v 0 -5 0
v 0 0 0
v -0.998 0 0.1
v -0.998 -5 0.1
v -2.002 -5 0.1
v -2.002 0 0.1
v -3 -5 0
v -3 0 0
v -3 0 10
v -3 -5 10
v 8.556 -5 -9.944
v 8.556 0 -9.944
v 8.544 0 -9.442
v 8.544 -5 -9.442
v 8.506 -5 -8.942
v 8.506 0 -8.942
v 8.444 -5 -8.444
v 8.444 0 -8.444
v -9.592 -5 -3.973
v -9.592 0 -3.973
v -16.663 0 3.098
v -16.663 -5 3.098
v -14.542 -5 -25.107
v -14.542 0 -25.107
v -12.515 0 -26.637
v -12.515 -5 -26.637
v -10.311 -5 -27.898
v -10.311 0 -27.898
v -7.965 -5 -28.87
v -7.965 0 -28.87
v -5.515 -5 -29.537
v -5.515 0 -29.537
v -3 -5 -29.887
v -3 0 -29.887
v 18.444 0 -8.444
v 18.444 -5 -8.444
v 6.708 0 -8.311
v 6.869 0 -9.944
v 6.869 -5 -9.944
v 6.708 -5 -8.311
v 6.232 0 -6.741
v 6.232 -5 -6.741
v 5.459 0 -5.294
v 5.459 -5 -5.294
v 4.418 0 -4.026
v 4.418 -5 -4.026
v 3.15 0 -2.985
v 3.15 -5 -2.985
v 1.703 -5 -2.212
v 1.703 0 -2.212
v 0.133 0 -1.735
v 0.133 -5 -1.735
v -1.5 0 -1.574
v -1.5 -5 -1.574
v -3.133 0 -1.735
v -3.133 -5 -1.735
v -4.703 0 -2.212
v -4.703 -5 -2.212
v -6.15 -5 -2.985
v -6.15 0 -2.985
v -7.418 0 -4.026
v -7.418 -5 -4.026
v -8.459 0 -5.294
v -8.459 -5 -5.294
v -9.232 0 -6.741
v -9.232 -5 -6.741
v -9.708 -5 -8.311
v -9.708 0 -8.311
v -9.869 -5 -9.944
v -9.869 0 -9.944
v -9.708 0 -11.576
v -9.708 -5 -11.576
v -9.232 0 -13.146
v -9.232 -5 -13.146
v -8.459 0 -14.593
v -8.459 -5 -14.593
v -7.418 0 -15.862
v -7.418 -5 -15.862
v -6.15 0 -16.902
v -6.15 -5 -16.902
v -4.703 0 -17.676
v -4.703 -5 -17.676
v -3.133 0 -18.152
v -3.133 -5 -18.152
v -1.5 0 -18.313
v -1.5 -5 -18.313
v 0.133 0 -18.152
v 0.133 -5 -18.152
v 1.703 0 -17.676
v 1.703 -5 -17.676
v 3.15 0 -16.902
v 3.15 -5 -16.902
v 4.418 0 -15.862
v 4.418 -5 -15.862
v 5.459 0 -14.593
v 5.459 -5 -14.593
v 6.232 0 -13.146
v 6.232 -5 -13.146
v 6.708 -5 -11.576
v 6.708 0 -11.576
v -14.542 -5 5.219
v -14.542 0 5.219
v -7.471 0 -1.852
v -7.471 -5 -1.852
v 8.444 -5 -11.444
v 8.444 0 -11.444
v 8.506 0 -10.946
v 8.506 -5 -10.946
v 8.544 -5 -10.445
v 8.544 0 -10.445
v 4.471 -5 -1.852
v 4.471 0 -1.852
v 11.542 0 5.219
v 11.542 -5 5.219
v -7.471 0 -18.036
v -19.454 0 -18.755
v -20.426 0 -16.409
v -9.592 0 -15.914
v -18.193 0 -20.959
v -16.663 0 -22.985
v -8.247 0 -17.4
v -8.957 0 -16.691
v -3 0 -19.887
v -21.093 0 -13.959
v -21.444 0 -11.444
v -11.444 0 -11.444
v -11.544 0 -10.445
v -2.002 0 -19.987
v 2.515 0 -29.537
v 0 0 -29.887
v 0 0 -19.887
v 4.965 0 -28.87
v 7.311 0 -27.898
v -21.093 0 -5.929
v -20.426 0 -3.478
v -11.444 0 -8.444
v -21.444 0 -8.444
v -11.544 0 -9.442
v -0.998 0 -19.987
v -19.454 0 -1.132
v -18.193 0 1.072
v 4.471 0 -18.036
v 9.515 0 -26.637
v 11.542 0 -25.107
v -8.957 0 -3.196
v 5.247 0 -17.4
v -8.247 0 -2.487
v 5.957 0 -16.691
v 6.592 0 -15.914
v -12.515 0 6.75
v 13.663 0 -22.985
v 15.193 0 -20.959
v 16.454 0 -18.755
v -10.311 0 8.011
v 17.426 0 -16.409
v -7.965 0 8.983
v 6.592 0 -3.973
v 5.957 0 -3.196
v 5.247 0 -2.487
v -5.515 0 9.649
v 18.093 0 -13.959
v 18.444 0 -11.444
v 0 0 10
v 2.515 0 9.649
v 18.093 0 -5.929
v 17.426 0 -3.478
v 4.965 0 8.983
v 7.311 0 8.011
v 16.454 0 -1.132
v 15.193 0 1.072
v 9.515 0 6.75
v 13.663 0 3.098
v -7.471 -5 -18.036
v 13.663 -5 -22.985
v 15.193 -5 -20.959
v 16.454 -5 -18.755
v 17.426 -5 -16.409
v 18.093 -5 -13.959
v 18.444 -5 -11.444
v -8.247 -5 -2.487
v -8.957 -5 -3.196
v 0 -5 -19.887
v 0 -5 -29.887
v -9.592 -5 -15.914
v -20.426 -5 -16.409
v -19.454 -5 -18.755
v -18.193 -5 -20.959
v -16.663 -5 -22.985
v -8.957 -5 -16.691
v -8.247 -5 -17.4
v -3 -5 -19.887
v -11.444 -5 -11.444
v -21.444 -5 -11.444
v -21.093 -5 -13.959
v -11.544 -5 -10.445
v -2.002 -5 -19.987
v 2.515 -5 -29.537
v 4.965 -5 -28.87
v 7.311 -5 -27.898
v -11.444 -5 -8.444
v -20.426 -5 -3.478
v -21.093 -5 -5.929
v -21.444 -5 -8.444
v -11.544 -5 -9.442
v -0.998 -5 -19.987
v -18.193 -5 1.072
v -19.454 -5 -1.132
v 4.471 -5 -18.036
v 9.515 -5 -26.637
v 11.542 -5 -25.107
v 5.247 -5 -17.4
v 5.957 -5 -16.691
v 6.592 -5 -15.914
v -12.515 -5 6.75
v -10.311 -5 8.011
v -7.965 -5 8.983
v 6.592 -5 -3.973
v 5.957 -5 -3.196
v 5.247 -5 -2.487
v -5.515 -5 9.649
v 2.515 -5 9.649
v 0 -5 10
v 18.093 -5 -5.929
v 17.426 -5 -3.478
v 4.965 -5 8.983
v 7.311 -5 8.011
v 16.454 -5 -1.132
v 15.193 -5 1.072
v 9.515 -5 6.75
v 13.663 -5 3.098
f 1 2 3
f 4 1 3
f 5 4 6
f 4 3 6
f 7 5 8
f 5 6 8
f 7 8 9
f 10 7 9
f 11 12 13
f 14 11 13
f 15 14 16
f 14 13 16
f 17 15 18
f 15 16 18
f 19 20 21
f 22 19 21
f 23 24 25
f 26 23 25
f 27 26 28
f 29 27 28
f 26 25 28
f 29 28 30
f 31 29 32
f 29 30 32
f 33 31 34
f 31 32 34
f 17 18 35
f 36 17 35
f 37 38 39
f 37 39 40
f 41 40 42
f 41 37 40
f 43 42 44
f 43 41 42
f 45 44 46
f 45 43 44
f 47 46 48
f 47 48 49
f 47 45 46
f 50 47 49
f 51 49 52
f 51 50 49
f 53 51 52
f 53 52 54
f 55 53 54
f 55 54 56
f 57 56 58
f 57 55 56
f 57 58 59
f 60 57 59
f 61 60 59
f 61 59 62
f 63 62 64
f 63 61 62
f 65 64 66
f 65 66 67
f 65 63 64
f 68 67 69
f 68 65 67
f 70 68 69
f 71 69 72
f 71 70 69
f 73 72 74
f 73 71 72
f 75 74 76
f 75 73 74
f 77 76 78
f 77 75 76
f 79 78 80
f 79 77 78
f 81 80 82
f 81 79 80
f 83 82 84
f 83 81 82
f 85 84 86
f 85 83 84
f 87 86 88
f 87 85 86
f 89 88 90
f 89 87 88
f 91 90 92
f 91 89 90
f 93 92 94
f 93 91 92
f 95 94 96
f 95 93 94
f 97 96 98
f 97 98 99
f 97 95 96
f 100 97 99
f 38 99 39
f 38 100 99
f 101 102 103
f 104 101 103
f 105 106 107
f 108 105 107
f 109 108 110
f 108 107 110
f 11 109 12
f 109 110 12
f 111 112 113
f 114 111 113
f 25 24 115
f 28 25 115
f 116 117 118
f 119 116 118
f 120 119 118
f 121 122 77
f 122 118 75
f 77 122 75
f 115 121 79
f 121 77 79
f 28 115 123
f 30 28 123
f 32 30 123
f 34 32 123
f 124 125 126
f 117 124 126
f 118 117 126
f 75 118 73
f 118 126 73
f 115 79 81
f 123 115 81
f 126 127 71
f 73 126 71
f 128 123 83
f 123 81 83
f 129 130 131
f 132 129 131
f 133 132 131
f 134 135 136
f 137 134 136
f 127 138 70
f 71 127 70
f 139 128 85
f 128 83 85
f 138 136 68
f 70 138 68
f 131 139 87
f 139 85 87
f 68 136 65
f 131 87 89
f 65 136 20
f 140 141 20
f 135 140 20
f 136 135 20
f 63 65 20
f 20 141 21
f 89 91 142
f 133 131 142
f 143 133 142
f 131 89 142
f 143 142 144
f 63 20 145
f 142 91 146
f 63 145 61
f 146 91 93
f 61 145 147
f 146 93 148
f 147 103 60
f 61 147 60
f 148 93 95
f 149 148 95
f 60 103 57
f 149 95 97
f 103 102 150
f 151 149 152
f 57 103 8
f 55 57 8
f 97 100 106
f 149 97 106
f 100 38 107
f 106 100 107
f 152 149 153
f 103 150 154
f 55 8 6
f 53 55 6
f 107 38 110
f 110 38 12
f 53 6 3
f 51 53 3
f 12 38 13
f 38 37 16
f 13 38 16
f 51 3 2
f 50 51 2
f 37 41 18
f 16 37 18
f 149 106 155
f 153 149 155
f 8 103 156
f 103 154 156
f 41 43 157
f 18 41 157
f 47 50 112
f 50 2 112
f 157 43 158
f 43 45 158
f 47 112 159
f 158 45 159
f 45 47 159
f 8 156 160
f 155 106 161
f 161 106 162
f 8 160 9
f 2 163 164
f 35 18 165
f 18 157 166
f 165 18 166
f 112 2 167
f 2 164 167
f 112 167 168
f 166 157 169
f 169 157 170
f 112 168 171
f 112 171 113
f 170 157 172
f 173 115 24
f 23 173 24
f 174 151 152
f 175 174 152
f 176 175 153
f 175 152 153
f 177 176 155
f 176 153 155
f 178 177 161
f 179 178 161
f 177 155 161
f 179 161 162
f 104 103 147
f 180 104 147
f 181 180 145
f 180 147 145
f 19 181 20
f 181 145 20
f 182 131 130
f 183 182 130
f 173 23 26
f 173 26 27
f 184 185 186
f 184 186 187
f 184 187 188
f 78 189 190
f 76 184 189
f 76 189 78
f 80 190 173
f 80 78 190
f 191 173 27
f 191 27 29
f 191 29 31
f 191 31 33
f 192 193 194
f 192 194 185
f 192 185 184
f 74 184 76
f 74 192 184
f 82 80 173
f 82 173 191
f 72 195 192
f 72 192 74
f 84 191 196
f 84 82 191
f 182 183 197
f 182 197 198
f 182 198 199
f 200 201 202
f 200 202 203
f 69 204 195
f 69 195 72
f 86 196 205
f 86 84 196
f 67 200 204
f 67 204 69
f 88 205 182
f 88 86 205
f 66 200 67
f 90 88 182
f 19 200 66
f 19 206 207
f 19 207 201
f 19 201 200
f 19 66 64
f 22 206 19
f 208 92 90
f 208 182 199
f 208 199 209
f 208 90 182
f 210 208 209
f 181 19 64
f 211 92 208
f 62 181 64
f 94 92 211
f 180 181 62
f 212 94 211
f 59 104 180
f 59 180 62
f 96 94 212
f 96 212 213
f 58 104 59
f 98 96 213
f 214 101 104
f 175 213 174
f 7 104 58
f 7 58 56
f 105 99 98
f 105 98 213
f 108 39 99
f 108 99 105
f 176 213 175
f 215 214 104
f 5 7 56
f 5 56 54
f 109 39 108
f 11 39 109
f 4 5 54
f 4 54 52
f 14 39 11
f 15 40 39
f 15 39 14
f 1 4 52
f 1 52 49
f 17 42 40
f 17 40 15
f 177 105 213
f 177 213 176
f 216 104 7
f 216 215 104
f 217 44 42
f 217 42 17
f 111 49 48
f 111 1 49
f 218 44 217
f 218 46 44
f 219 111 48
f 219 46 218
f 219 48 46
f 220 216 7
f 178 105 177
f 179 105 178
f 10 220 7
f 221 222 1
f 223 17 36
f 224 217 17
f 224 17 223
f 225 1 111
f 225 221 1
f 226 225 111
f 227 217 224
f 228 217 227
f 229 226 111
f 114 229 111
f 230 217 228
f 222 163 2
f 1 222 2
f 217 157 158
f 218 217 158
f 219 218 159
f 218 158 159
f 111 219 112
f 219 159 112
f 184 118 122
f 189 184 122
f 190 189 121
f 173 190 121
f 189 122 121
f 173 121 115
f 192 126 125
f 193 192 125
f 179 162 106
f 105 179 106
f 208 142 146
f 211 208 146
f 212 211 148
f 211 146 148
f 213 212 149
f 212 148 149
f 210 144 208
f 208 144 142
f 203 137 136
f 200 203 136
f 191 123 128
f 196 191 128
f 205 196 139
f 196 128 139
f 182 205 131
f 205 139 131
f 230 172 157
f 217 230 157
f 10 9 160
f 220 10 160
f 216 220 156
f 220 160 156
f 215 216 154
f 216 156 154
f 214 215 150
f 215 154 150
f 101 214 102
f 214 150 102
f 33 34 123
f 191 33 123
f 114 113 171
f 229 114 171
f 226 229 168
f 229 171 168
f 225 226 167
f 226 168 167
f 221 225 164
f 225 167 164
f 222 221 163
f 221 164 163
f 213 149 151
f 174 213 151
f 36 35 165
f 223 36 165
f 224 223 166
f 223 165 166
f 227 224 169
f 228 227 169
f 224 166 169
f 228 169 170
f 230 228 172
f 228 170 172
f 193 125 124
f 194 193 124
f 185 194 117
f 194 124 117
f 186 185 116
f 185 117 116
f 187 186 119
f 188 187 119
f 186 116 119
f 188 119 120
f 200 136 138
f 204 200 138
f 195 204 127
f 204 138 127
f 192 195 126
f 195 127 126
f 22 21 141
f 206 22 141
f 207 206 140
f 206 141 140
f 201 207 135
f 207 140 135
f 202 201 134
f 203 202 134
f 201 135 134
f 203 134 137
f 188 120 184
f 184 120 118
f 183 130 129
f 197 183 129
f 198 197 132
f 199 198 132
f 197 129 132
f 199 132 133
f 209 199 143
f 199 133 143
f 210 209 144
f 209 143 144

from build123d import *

# Parameters (mm, degrees)
F0_R     = 8.3692261917
F1_DEPTH = 5
F2_DEPTH = 5


with BuildPart() as f1:
    # F0 (on Front) → F1 (new body)
    with BuildSketch(Plane.XZ):
        with BuildLine():
            ThreePointArc((4.4705767925, -1.8517735391), (2.34833025, -0.6529795931), (0, 0))
            Line((0, 0), (-3, 0))
            ThreePointArc((-3, 0), (-5.34833025, -0.6529795931), (-7.4705767925, -1.8517735391))
            Line((-7.4705767925, -1.8517735391), (-9.5918971361, -3.9730938827))
            ThreePointArc((-9.5918971361, -3.9730938827), (-10.7906910821, -6.0953404252), (-11.4436706752, -8.4436706752))
            Line((-11.4436706752, -8.4436706752), (-11.4436706752, -11.4436706752))
            ThreePointArc((-11.4436706752, -11.4436706752), (-10.7906910821, -13.7920009252), (-9.5918971361, -15.9142474677))
            Line((-9.5918971361, -15.9142474677), (-7.4705767925, -18.0355678113))
            ThreePointArc((-7.4705767925, -18.0355678113), (-5.34833025, -19.2343617573), (-3, -19.8873413504))
            Line((-3, -19.8873413504), (0, -19.8873413504))
            ThreePointArc((0, -19.8873413504), (2.34833025, -19.2343617573), (4.4705767925, -18.0355678113))
            Line((4.4705767925, -18.0355678113), (6.5918971361, -15.9142474677))
            ThreePointArc((6.5918971361, -15.9142474677), (7.7906910821, -13.7920009252), (8.4436706752, -11.4436706752))
            Line((8.4436706752, -11.4436706752), (8.4436706752, -8.4436706752))
            ThreePointArc((8.4436706752, -8.4436706752), (7.7906910821, -6.0953404252), (6.5918971361, -3.9730938827))
            Line((6.5918971361, -3.9730938827), (4.4705767925, -1.8517735391))
        make_face()
        with Locations((-1.5, -9.9436706752)):
            Circle(F0_R, mode=Mode.SUBTRACT)
        with BuildLine():
            Line((0, 10), (0, 0))
            ThreePointArc((0, 0), (2.34833025, -0.6529795931), (4.4705767925, -1.8517735391))
            Line((4.4705767925, -1.8517735391), (11.5416446044, 5.2192942728))
            ThreePointArc((11.5416446044, 5.2192942728), (6.1536686473, 8.533919975), (0, 10))
        make_face()
        with BuildLine():
            Line((-3, 0), (0, 0))
            ThreePointArc((0, 0), (-1.5, 0.1125008874), (-3, 0))
        make_face()
        with BuildLine():
            ThreePointArc((-7.4705767925, -1.8517735391), (-5.34833025, -0.6529795931), (-3, 0))
            Line((-3, 0), (-3, 10))
            ThreePointArc((-3, 10), (-9.1536686473, 8.533919975), (-14.5416446044, 5.2192942728))
            Line((-14.5416446044, 5.2192942728), (-7.4705767925, -1.8517735391))
        make_face()
        with BuildLine():
            ThreePointArc((6.5918971361, -3.9730938827), (5.6107871047, -2.8328835705), (4.4705767925, -1.8517735391))
            Line((4.4705767925, -1.8517735391), (6.5918971361, -3.9730938827))
        make_face()
        with BuildLine():
            Line((-9.5918971361, -3.9730938827), (-7.4705767925, -1.8517735391))
            ThreePointArc((-7.4705767925, -1.8517735391), (-8.6107871047, -2.8328835705), (-9.5918971361, -3.9730938827))
        make_face()
        with BuildLine():
            Line((13.662964948, 3.0979739292), (6.5918971361, -3.9730938827))
            ThreePointArc((6.5918971361, -3.9730938827), (7.7906910821, -6.0953404252), (8.4436706752, -8.4436706752))
            Line((8.4436706752, -8.4436706752), (18.4436706752, -8.4436706752))
            ThreePointArc((18.4436706752, -8.4436706752), (16.9775906502, -2.2900020279), (13.662964948, 3.0979739292))
        make_face()
        with BuildLine():
            ThreePointArc((-11.4436706752, -8.4436706752), (-10.7906910821, -6.0953404252), (-9.5918971361, -3.9730938827))
            Line((-9.5918971361, -3.9730938827), (-16.662964948, 3.0979739292))
            ThreePointArc((-16.662964948, 3.0979739292), (-19.9775906502, -2.2900020279), (-21.4436706752, -8.4436706752))
            Line((-21.4436706752, -8.4436706752), (-11.4436706752, -8.4436706752))
        make_face()
        with BuildLine():
            ThreePointArc((8.5561715626, -9.9436706752), (8.5280068999, -9.191564225), (8.4436706752, -8.4436706752))
            Line((8.4436706752, -8.4436706752), (8.4436706752, -11.4436706752))
            ThreePointArc((8.4436706752, -11.4436706752), (8.5280068999, -10.6957771254), (8.5561715626, -9.9436706752))
        make_face()
        with BuildLine():
            Line((-11.4436706752, -11.4436706752), (-11.4436706752, -8.4436706752))
            ThreePointArc((-11.4436706752, -8.4436706752), (-11.5561715626, -9.9436706752), (-11.4436706752, -11.4436706752))
        make_face()
        with BuildLine():
            Line((18.4436706752, -11.4436706752), (8.4436706752, -11.4436706752))
            ThreePointArc((8.4436706752, -11.4436706752), (7.7906910821, -13.7920009252), (6.5918971361, -15.9142474677))
            Line((6.5918971361, -15.9142474677), (13.662964948, -22.9853152796))
            ThreePointArc((13.662964948, -22.9853152796), (16.9775906502, -17.5973393225), (18.4436706752, -11.4436706752))
        make_face()
        with BuildLine():
            ThreePointArc((-9.5918971361, -15.9142474677), (-10.7906910821, -13.7920009252), (-11.4436706752, -11.4436706752))
            Line((-11.4436706752, -11.4436706752), (-21.4436706752, -11.4436706752))
            ThreePointArc((-21.4436706752, -11.4436706752), (-19.9775906502, -17.5973393225), (-16.662964948, -22.9853152796))
            Line((-16.662964948, -22.9853152796), (-9.5918971361, -15.9142474677))
        make_face()
        with BuildLine():
            ThreePointArc((4.4705767925, -18.0355678113), (5.6107871047, -17.0544577799), (6.5918971361, -15.9142474677))
            Line((6.5918971361, -15.9142474677), (4.4705767925, -18.0355678113))
        make_face()
        with BuildLine():
            Line((-7.4705767925, -18.0355678113), (-9.5918971361, -15.9142474677))
            ThreePointArc((-9.5918971361, -15.9142474677), (-8.6107871047, -17.0544577799), (-7.4705767925, -18.0355678113))
        make_face()
        with BuildLine():
            Line((11.5416446044, -25.1066356231), (4.4705767925, -18.0355678113))
            ThreePointArc((4.4705767925, -18.0355678113), (2.34833025, -19.2343617573), (0, -19.8873413504))
            Line((0, -19.8873413504), (0, -29.8873413504))
            ThreePointArc((0, -29.8873413504), (6.1536686473, -28.4212613254), (11.5416446044, -25.1066356231))
        make_face()
        with BuildLine():
            ThreePointArc((-3, -19.8873413504), (-5.34833025, -19.2343617573), (-7.4705767925, -18.0355678113))
            Line((-7.4705767925, -18.0355678113), (-14.5416446044, -25.1066356231))
            ThreePointArc((-14.5416446044, -25.1066356231), (-9.1536686473, -28.4212613254), (-3, -29.8873413504))
            Line((-3, -29.8873413504), (-3, -19.8873413504))
        make_face()
        with BuildLine():
            ThreePointArc((-3, -19.8873413504), (-1.5, -19.9998422378), (0, -19.8873413504))
            Line((0, -19.8873413504), (-3, -19.8873413504))
        make_face()
    extrude(amount=F1_DEPTH)

    # F0 (on Front) → F2 (join)
    with BuildSketch(Plane.XZ):
        with BuildLine():
            ThreePointArc((4.4705767925, -1.8517735391), (2.34833025, -0.6529795931), (0, 0))
            Line((0, 0), (-3, 0))
            ThreePointArc((-3, 0), (-5.34833025, -0.6529795931), (-7.4705767925, -1.8517735391))
            Line((-7.4705767925, -1.8517735391), (-9.5918971361, -3.9730938827))
            ThreePointArc((-9.5918971361, -3.9730938827), (-10.7906910821, -6.0953404252), (-11.4436706752, -8.4436706752))
            Line((-11.4436706752, -8.4436706752), (-11.4436706752, -11.4436706752))
            ThreePointArc((-11.4436706752, -11.4436706752), (-10.7906910821, -13.7920009252), (-9.5918971361, -15.9142474677))
            Line((-9.5918971361, -15.9142474677), (-7.4705767925, -18.0355678113))
            ThreePointArc((-7.4705767925, -18.0355678113), (-5.34833025, -19.2343617573), (-3, -19.8873413504))
            Line((-3, -19.8873413504), (0, -19.8873413504))
            ThreePointArc((0, -19.8873413504), (2.34833025, -19.2343617573), (4.4705767925, -18.0355678113))
            Line((4.4705767925, -18.0355678113), (6.5918971361, -15.9142474677))
            ThreePointArc((6.5918971361, -15.9142474677), (7.7906910821, -13.7920009252), (8.4436706752, -11.4436706752))
            Line((8.4436706752, -11.4436706752), (8.4436706752, -8.4436706752))
            ThreePointArc((8.4436706752, -8.4436706752), (7.7906910821, -6.0953404252), (6.5918971361, -3.9730938827))
            Line((6.5918971361, -3.9730938827), (4.4705767925, -1.8517735391))
        make_face()
        with Locations((-1.5, -9.9436706752)):
            Circle(F0_R, mode=Mode.SUBTRACT)
        with BuildLine():
            Line((0, 10), (0, 0))
            ThreePointArc((0, 0), (2.34833025, -0.6529795931), (4.4705767925, -1.8517735391))
            Line((4.4705767925, -1.8517735391), (11.5416446044, 5.2192942728))
            ThreePointArc((11.5416446044, 5.2192942728), (6.1536686473, 8.533919975), (0, 10))
        make_face()
        with BuildLine():
            Line((-3, 0), (0, 0))
            ThreePointArc((0, 0), (-1.5, 0.1125008874), (-3, 0))
        make_face()
        with BuildLine():
            ThreePointArc((-7.4705767925, -1.8517735391), (-5.34833025, -0.6529795931), (-3, 0))
            Line((-3, 0), (-3, 10))
            ThreePointArc((-3, 10), (-9.1536686473, 8.533919975), (-14.5416446044, 5.2192942728))
            Line((-14.5416446044, 5.2192942728), (-7.4705767925, -1.8517735391))
        make_face()
        with BuildLine():
            ThreePointArc((6.5918971361, -3.9730938827), (5.6107871047, -2.8328835705), (4.4705767925, -1.8517735391))
            Line((4.4705767925, -1.8517735391), (6.5918971361, -3.9730938827))
        make_face()
        with BuildLine():
            Line((-9.5918971361, -3.9730938827), (-7.4705767925, -1.8517735391))
            ThreePointArc((-7.4705767925, -1.8517735391), (-8.6107871047, -2.8328835705), (-9.5918971361, -3.9730938827))
        make_face()
        with BuildLine():
            Line((13.662964948, 3.0979739292), (6.5918971361, -3.9730938827))
            ThreePointArc((6.5918971361, -3.9730938827), (7.7906910821, -6.0953404252), (8.4436706752, -8.4436706752))
            Line((8.4436706752, -8.4436706752), (18.4436706752, -8.4436706752))
            ThreePointArc((18.4436706752, -8.4436706752), (16.9775906502, -2.2900020279), (13.662964948, 3.0979739292))
        make_face()
        with BuildLine():
            ThreePointArc((-11.4436706752, -8.4436706752), (-10.7906910821, -6.0953404252), (-9.5918971361, -3.9730938827))
            Line((-9.5918971361, -3.9730938827), (-16.662964948, 3.0979739292))
            ThreePointArc((-16.662964948, 3.0979739292), (-19.9775906502, -2.2900020279), (-21.4436706752, -8.4436706752))
            Line((-21.4436706752, -8.4436706752), (-11.4436706752, -8.4436706752))
        make_face()
        with BuildLine():
            ThreePointArc((8.5561715626, -9.9436706752), (8.5280068999, -9.191564225), (8.4436706752, -8.4436706752))
            Line((8.4436706752, -8.4436706752), (8.4436706752, -11.4436706752))
            ThreePointArc((8.4436706752, -11.4436706752), (8.5280068999, -10.6957771254), (8.5561715626, -9.9436706752))
        make_face()
        with BuildLine():
            Line((-11.4436706752, -11.4436706752), (-11.4436706752, -8.4436706752))
            ThreePointArc((-11.4436706752, -8.4436706752), (-11.5561715626, -9.9436706752), (-11.4436706752, -11.4436706752))
        make_face()
        with BuildLine():
            Line((18.4436706752, -11.4436706752), (8.4436706752, -11.4436706752))
            ThreePointArc((8.4436706752, -11.4436706752), (7.7906910821, -13.7920009252), (6.5918971361, -15.9142474677))
            Line((6.5918971361, -15.9142474677), (13.662964948, -22.9853152796))
            ThreePointArc((13.662964948, -22.9853152796), (16.9775906502, -17.5973393225), (18.4436706752, -11.4436706752))
        make_face()
        with BuildLine():
            ThreePointArc((-9.5918971361, -15.9142474677), (-10.7906910821, -13.7920009252), (-11.4436706752, -11.4436706752))
            Line((-11.4436706752, -11.4436706752), (-21.4436706752, -11.4436706752))
            ThreePointArc((-21.4436706752, -11.4436706752), (-19.9775906502, -17.5973393225), (-16.662964948, -22.9853152796))
            Line((-16.662964948, -22.9853152796), (-9.5918971361, -15.9142474677))
        make_face()
        with BuildLine():
            ThreePointArc((4.4705767925, -18.0355678113), (5.6107871047, -17.0544577799), (6.5918971361, -15.9142474677))
            Line((6.5918971361, -15.9142474677), (4.4705767925, -18.0355678113))
        make_face()
        with BuildLine():
            Line((-7.4705767925, -18.0355678113), (-9.5918971361, -15.9142474677))
            ThreePointArc((-9.5918971361, -15.9142474677), (-8.6107871047, -17.0544577799), (-7.4705767925, -18.0355678113))
        make_face()
        with BuildLine():
            Line((11.5416446044, -25.1066356231), (4.4705767925, -18.0355678113))
            ThreePointArc((4.4705767925, -18.0355678113), (2.34833025, -19.2343617573), (0, -19.8873413504))
            Line((0, -19.8873413504), (0, -29.8873413504))
            ThreePointArc((0, -29.8873413504), (6.1536686473, -28.4212613254), (11.5416446044, -25.1066356231))
        make_face()
        with BuildLine():
            ThreePointArc((-3, -19.8873413504), (-5.34833025, -19.2343617573), (-7.4705767925, -18.0355678113))
            Line((-7.4705767925, -18.0355678113), (-14.5416446044, -25.1066356231))
            ThreePointArc((-14.5416446044, -25.1066356231), (-9.1536686473, -28.4212613254), (-3, -29.8873413504))
            Line((-3, -29.8873413504), (-3, -19.8873413504))
        make_face()
        with BuildLine():
            ThreePointArc((-3, -19.8873413504), (-1.5, -19.9998422378), (0, -19.8873413504))
            Line((0, -19.8873413504), (-3, -19.8873413504))
        make_face()
    extrude(amount=F2_DEPTH)


solid = f1.part
